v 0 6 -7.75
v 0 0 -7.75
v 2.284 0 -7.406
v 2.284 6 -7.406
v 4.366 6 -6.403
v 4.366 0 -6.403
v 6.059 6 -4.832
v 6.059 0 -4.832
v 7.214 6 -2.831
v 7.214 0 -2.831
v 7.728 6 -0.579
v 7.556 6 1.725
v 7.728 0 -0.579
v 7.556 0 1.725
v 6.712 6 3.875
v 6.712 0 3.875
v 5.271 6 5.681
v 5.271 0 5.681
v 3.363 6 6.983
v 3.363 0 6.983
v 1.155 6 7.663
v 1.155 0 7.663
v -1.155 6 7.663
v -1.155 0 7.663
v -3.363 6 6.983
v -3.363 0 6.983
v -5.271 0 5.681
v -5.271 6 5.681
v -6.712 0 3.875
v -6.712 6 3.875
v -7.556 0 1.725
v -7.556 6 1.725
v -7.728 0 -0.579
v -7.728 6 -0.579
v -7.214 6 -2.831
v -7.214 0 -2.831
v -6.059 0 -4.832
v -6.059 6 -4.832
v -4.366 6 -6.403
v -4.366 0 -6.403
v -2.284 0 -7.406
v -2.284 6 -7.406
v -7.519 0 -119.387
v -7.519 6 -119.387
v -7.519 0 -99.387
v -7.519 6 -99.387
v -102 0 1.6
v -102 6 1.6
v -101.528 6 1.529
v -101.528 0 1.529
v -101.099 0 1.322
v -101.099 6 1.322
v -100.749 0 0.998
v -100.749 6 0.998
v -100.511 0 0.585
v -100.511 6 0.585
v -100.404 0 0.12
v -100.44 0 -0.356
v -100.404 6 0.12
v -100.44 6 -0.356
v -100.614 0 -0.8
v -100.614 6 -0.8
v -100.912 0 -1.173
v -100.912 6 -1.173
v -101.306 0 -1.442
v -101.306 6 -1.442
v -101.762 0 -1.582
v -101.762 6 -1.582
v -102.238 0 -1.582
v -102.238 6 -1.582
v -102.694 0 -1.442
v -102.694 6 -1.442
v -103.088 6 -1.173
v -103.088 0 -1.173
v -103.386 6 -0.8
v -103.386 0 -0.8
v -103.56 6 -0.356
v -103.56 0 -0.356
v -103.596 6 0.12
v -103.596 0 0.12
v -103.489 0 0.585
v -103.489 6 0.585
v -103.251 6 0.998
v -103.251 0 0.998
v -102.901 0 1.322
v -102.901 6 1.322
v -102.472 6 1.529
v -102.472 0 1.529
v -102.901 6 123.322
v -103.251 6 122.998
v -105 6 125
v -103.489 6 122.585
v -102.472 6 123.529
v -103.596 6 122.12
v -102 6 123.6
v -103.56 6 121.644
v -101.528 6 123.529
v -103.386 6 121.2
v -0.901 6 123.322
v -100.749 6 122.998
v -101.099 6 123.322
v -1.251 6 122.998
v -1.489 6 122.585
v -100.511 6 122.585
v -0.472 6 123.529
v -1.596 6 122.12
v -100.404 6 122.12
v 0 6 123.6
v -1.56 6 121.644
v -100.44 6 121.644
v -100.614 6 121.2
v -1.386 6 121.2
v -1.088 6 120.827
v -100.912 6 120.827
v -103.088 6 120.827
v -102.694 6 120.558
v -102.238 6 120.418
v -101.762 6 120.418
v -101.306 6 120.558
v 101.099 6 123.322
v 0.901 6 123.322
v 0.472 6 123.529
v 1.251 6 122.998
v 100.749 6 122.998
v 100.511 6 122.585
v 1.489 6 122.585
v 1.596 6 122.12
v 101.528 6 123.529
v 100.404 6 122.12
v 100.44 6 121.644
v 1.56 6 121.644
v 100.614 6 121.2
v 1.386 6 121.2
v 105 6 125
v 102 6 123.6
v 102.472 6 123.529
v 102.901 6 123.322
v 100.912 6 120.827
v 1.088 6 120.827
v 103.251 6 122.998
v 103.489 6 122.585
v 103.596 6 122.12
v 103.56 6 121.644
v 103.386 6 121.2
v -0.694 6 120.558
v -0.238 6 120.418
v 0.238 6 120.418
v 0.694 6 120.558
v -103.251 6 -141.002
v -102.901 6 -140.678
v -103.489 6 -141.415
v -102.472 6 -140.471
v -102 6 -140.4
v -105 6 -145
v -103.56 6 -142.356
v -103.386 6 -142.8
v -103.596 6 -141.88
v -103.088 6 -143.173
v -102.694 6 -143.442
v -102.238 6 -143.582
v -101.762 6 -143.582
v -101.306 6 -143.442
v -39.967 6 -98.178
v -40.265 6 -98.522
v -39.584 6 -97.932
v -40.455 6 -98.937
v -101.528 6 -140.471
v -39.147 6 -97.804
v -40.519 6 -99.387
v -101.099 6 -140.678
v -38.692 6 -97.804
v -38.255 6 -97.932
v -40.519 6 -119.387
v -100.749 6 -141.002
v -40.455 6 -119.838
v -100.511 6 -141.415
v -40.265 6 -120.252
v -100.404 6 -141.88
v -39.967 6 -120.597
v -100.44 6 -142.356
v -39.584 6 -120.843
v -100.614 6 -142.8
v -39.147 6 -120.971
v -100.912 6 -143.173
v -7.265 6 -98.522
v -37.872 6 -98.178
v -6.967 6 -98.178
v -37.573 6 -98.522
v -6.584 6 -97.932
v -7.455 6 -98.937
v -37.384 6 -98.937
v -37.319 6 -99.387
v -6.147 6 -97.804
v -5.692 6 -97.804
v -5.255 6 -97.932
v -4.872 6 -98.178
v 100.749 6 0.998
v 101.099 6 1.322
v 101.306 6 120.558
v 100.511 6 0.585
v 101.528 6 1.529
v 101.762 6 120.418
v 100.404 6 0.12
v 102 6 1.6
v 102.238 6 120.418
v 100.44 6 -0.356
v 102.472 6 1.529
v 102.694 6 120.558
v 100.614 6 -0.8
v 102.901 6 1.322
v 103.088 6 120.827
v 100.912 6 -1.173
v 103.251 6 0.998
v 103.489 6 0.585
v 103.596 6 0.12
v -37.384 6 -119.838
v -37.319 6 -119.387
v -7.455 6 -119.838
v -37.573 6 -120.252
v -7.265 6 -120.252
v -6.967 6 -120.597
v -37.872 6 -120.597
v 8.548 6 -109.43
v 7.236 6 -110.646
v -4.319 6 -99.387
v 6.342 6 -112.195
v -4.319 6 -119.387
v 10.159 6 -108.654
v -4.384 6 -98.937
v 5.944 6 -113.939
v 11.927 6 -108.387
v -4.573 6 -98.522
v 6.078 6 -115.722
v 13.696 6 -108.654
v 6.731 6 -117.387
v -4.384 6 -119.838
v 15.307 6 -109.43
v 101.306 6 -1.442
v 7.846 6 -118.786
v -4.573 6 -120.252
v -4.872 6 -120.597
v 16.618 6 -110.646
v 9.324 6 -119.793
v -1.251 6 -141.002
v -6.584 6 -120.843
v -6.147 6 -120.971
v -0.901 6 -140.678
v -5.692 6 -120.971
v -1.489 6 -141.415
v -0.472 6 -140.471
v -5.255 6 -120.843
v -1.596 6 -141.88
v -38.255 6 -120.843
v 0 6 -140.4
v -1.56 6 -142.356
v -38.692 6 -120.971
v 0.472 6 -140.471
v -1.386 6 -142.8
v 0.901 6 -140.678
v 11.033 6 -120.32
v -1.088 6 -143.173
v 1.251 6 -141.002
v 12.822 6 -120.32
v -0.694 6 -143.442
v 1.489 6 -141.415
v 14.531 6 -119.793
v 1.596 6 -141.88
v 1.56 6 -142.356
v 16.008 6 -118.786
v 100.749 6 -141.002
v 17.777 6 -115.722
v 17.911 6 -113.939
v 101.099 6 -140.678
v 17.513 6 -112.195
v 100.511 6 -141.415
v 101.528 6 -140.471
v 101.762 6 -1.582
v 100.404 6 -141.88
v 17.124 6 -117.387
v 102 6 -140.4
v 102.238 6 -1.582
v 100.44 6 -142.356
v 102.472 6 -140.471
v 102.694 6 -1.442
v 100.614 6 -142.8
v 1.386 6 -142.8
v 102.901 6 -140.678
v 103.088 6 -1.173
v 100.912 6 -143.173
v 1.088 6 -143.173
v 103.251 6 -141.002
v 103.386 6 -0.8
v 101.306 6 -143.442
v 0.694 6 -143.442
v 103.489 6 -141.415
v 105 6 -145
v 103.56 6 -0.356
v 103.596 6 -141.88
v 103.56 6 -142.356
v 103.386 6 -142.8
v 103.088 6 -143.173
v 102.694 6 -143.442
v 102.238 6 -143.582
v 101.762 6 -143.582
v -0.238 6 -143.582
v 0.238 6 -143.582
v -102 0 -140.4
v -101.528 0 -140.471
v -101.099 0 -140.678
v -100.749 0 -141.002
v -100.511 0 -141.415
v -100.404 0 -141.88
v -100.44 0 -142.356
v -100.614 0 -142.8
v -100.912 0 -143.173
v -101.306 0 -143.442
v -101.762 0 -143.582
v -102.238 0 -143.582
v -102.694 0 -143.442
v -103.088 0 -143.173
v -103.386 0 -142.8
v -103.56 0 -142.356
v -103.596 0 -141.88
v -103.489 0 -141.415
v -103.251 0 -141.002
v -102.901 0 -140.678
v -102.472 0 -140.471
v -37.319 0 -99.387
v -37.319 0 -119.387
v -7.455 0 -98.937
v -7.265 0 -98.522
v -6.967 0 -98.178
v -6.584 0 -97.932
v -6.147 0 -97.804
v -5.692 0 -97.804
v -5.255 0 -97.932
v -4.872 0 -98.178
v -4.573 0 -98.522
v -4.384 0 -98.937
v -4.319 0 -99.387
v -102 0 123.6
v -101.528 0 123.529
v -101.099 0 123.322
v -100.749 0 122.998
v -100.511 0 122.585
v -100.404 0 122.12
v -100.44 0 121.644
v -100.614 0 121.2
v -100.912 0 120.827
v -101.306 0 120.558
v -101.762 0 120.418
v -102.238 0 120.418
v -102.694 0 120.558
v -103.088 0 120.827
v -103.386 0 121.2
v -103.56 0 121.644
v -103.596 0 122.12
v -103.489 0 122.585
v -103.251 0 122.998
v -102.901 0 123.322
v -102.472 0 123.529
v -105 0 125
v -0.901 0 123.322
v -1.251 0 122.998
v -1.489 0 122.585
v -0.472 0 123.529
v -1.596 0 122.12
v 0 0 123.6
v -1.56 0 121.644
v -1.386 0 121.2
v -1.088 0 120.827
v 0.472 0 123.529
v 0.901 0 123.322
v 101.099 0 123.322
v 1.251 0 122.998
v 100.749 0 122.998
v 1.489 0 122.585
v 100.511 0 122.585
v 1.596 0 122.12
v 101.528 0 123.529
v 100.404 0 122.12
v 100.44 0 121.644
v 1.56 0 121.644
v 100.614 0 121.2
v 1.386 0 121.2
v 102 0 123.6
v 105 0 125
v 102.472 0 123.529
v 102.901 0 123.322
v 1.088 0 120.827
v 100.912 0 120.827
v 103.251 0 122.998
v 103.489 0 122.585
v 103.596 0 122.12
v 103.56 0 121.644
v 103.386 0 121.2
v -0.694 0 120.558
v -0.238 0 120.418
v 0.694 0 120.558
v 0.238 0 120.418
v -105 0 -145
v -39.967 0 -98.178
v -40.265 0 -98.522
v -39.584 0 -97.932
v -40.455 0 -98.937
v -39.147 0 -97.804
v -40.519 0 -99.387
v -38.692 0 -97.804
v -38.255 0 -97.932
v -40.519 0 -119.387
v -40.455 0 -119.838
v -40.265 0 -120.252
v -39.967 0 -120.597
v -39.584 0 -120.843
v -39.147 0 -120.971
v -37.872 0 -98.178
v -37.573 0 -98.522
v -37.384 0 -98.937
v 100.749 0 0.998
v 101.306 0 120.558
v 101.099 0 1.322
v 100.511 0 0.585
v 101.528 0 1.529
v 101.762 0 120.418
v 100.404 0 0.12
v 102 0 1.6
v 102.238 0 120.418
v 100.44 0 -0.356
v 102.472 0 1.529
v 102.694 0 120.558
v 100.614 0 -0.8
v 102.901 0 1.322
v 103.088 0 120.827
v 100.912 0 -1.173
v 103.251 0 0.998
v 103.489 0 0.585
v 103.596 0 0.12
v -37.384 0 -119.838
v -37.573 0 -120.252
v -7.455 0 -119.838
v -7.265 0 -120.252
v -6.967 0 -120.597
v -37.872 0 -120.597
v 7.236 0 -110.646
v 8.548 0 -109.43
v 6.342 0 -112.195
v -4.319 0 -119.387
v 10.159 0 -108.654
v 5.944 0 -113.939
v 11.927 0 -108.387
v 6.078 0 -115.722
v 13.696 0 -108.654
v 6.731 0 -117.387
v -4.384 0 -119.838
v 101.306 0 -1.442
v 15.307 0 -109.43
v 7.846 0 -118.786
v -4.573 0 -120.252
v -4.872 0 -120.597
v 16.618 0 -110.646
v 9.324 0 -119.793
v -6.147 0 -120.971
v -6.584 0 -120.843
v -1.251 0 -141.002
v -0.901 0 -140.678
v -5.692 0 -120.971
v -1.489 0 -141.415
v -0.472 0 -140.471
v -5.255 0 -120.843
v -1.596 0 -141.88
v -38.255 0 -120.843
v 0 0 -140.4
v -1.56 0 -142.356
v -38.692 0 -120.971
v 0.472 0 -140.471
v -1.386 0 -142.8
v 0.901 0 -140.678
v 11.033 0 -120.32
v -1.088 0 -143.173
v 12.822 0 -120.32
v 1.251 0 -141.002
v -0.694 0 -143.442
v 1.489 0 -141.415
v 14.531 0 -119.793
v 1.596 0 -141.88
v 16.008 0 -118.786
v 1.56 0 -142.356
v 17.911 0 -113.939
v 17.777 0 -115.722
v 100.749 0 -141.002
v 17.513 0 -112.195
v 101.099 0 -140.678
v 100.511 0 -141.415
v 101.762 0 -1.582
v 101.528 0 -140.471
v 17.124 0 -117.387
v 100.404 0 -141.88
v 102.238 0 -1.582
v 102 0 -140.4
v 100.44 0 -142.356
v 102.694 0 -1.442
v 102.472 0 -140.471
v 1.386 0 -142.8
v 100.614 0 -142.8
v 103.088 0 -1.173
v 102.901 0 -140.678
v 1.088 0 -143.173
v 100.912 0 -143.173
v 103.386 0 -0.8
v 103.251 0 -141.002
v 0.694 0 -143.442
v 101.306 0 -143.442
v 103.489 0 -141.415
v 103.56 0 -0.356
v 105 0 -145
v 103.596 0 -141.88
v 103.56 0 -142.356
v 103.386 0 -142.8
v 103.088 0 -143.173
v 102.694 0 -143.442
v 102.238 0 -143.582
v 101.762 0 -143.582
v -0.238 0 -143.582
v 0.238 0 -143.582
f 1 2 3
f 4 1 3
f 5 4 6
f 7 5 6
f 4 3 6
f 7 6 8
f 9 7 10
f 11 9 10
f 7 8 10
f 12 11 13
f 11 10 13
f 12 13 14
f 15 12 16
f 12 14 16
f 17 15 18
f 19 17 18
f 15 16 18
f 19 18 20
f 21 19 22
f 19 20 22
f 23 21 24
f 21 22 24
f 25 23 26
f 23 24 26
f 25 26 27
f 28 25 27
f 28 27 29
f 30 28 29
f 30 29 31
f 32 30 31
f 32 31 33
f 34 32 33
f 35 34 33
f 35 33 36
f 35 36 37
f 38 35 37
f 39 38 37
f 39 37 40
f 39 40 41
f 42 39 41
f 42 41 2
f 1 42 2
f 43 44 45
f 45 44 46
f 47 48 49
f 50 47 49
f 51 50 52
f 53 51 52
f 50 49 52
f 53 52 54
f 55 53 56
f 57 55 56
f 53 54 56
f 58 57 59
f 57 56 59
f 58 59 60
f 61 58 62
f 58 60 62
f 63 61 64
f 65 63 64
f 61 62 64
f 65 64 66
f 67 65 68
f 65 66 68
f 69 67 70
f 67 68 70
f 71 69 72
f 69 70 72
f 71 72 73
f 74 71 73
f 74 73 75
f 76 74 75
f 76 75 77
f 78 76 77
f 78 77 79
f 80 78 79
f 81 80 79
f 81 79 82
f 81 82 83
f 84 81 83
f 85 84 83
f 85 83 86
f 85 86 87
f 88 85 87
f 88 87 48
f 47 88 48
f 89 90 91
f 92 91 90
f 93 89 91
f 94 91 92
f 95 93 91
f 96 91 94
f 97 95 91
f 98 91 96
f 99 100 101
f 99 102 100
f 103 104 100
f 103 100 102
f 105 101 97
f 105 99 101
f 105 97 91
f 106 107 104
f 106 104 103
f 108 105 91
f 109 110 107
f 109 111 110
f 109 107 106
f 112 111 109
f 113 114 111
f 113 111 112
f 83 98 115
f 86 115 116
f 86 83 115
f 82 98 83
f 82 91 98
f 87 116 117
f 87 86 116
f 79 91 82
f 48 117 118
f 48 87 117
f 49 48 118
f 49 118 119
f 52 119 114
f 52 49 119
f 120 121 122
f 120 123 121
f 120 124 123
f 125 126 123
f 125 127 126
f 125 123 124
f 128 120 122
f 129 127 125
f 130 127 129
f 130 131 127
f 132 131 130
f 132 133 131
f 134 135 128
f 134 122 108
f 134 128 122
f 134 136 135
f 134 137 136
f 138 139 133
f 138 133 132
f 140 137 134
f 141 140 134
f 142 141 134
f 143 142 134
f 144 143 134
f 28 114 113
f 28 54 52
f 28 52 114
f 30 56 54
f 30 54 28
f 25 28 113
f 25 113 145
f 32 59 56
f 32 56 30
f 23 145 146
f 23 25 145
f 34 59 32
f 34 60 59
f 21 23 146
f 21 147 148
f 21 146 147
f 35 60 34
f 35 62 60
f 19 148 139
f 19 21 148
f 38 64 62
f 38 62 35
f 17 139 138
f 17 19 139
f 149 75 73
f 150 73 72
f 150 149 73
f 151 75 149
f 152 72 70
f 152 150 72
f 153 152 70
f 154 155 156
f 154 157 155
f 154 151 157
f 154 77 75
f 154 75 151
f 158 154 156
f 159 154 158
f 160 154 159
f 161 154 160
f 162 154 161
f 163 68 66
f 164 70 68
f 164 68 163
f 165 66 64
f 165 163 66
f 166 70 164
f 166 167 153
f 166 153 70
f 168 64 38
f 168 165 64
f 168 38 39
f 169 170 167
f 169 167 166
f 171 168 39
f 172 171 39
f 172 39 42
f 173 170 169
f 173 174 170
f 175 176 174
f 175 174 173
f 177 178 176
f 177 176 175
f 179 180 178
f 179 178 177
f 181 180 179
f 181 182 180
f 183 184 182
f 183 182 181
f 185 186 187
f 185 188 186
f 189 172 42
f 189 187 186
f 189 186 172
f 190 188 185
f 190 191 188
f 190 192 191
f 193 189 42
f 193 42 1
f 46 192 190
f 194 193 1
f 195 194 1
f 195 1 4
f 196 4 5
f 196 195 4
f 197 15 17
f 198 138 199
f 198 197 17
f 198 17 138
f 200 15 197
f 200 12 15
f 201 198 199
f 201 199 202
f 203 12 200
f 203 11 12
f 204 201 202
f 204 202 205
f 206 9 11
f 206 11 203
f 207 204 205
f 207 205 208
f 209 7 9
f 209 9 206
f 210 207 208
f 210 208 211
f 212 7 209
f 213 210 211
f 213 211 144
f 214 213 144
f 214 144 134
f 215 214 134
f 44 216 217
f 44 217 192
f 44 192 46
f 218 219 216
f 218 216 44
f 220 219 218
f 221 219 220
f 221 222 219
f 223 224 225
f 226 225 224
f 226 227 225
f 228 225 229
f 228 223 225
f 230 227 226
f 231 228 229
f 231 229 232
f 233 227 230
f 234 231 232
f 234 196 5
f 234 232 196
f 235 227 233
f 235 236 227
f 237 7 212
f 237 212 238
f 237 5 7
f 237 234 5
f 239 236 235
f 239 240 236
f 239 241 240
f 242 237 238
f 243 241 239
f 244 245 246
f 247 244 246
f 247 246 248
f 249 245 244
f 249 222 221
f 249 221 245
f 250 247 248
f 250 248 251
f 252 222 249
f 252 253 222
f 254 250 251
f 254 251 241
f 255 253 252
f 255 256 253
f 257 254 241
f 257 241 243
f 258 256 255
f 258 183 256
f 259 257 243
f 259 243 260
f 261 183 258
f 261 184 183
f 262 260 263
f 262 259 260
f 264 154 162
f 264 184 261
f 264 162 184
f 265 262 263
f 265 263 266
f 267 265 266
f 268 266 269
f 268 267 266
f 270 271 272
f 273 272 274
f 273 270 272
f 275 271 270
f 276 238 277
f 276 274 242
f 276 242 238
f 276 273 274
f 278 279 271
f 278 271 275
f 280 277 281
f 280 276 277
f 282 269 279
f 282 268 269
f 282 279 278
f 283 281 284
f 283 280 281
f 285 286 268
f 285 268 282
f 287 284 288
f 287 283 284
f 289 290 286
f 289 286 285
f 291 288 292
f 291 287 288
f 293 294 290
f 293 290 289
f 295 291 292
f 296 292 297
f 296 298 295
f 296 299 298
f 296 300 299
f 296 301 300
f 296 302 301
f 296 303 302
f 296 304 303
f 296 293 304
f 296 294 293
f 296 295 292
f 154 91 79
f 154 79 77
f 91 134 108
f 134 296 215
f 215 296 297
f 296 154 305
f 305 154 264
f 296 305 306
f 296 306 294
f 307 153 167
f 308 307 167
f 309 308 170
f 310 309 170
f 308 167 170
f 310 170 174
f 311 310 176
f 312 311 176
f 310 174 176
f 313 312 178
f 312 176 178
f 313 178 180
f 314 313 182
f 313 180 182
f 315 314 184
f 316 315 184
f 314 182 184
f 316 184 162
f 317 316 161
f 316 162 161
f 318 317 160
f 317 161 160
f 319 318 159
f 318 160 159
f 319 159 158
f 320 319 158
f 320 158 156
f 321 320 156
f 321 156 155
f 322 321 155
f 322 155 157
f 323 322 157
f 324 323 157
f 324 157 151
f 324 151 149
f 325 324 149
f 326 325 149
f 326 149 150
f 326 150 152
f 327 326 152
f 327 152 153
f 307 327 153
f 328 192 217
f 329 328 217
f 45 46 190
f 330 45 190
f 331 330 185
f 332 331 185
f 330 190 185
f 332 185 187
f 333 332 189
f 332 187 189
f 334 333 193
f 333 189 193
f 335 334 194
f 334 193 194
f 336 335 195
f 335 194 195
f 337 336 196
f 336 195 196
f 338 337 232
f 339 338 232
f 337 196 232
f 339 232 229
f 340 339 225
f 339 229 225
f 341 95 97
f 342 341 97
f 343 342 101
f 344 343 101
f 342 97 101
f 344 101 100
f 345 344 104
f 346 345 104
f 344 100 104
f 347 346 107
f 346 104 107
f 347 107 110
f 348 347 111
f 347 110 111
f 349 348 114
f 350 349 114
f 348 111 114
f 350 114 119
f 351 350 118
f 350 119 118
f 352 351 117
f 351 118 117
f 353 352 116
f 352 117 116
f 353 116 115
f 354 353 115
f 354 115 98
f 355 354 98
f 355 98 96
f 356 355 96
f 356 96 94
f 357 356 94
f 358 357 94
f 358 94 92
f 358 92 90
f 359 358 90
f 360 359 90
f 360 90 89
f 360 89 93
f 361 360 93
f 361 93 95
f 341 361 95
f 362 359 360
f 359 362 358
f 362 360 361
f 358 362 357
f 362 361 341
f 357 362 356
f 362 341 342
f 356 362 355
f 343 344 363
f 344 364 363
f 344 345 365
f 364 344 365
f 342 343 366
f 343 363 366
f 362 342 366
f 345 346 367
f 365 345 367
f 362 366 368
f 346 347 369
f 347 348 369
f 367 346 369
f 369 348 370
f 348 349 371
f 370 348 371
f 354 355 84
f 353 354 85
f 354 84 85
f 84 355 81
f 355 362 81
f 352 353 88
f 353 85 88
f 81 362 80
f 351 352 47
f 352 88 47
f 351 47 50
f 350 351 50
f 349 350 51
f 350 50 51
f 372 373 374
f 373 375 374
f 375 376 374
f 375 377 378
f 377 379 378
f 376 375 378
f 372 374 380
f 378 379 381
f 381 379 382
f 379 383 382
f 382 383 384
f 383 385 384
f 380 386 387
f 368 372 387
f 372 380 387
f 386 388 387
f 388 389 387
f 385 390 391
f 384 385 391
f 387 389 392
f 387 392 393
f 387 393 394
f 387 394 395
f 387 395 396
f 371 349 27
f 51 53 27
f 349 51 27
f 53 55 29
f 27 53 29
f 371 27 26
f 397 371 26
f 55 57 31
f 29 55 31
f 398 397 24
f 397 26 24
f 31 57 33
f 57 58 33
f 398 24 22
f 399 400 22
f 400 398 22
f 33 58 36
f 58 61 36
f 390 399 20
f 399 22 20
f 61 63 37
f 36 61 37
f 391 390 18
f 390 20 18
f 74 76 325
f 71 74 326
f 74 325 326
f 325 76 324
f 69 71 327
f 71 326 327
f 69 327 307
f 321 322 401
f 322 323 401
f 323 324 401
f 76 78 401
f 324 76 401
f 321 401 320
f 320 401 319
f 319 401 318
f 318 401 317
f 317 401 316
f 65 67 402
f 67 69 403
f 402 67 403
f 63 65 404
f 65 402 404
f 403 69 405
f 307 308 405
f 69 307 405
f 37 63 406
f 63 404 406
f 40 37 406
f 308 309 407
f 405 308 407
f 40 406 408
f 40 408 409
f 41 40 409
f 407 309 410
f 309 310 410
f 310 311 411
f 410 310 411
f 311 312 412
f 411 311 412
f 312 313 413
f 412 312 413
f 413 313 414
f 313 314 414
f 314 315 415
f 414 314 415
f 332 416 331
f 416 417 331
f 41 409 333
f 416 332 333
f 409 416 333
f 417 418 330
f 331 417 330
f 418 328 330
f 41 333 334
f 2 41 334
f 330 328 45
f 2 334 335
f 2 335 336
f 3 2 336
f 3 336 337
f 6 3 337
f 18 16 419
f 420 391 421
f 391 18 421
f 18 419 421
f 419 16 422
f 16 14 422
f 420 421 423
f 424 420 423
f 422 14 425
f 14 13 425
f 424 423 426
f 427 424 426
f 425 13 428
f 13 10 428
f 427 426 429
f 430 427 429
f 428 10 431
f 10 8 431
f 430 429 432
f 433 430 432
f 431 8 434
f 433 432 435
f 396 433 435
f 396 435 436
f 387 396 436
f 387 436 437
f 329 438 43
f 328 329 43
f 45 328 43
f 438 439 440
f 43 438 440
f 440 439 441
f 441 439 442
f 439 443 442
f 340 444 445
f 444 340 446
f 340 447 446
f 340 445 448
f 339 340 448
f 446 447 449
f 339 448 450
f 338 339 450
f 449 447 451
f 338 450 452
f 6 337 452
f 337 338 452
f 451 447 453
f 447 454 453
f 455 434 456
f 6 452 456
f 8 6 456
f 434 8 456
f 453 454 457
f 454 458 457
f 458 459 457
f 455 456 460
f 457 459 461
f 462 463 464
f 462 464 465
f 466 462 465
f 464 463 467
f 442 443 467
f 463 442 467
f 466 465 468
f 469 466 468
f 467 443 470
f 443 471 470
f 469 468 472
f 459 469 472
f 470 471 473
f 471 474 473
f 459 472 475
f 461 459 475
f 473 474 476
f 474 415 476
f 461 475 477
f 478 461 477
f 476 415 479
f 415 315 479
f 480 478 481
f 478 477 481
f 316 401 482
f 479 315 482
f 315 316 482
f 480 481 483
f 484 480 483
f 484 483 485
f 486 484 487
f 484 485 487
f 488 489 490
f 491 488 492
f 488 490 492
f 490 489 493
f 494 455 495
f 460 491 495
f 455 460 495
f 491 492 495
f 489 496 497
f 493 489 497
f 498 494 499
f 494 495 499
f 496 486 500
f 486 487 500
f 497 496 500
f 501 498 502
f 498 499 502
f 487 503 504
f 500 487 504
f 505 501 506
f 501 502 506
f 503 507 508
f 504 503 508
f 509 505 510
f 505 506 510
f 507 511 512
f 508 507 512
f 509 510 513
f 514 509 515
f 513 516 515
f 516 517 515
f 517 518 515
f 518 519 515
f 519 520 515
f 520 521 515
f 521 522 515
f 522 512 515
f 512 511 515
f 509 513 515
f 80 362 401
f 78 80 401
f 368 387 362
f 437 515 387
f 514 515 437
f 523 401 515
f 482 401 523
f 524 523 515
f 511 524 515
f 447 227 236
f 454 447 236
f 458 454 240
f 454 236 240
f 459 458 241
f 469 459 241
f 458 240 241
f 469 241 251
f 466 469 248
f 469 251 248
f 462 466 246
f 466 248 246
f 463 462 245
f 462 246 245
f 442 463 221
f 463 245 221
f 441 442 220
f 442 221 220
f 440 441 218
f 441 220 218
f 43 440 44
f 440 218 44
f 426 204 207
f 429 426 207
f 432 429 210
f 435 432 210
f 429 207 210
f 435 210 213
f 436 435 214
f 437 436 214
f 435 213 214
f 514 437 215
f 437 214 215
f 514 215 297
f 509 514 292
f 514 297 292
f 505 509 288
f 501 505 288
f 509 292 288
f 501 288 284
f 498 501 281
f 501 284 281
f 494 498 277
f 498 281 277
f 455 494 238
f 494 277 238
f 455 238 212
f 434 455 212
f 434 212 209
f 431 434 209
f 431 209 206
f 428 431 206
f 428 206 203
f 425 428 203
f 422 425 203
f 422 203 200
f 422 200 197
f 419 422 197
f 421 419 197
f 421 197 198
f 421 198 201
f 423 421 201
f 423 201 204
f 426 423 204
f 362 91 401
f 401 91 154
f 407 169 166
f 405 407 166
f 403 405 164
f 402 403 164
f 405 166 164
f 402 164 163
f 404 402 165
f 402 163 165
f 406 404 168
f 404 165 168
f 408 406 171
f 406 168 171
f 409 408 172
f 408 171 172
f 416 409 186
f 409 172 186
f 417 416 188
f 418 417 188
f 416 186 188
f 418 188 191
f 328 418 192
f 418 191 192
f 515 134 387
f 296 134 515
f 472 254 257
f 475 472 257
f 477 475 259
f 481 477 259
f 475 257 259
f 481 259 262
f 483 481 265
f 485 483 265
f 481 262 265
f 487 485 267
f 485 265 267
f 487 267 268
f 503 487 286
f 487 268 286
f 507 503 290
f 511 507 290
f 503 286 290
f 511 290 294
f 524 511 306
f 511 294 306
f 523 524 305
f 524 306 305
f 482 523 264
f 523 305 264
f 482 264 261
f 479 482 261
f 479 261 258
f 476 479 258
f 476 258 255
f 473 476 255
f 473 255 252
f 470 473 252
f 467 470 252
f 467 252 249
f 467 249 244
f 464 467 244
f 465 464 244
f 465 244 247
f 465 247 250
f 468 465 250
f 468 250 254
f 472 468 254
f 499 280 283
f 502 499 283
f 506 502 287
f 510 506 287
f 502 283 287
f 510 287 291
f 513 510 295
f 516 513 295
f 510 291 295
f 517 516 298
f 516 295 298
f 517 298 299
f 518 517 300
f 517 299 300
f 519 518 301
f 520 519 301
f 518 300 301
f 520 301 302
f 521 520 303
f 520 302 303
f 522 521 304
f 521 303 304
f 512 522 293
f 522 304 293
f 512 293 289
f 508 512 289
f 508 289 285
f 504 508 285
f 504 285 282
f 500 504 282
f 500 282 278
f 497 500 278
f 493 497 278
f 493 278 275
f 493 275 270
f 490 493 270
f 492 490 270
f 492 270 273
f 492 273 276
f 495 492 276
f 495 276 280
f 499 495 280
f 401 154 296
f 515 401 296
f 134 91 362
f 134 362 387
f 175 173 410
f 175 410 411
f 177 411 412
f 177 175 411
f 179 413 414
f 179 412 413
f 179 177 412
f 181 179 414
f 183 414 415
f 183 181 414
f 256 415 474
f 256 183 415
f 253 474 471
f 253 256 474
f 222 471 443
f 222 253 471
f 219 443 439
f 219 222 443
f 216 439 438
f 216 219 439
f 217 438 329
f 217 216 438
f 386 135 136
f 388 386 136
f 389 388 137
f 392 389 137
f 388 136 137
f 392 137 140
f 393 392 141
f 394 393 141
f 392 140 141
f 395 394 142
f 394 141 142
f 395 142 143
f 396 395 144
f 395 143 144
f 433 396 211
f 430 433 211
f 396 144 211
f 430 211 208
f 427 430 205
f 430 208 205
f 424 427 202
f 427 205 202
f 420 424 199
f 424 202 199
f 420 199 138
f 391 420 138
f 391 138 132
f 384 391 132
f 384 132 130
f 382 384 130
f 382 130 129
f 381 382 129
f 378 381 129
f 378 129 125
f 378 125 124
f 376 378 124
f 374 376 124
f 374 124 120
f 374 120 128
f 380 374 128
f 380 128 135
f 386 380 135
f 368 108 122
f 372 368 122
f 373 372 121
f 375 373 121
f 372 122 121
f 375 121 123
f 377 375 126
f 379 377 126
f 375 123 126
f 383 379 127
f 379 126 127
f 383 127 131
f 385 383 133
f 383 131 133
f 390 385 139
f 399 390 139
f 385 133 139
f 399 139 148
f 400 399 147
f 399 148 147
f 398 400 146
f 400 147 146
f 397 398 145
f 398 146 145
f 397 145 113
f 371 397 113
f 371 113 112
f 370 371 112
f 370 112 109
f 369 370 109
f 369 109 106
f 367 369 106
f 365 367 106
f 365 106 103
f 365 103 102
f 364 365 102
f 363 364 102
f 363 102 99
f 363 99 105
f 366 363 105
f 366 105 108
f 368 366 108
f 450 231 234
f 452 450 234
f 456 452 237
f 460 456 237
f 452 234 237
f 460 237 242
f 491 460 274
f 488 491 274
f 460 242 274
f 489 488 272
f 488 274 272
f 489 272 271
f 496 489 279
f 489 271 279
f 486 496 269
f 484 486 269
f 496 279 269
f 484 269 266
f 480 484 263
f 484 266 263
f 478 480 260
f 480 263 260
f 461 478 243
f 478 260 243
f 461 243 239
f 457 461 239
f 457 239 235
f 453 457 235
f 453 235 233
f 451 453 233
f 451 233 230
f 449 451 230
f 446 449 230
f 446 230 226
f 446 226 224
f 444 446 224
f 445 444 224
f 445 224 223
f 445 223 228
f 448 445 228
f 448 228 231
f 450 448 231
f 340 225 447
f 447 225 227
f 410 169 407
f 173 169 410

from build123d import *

# Parameters (mm, degrees)
SKETCH1_W                                         = 150
SKETCH1_H                                         = 250
SKETCH1_R                                         = 1.75
BOSS_EXTRUDE1_DEPTH                               = 6
SKETCH2_R                                         = 11.25
CUT_EXTRUDE1_DEPTH                                = 6
CSK_FOR_M3_FLAT_HEAD_MACHINE_SCREW1_D             = 3.4
CSK_FOR_M3_FLAT_HEAD_MACHINE_SCREW1_CSINK_D       = 6.3
CSK_FOR_M3_FLAT_HEAD_MACHINE_SCREW1_CSINK_ANGLE   = 90
SKETCH5_W                                         = 150
SKETCH5_H                                         = 20
BOSS_EXTRUDE2_DEPTH                               = 6
CUT_EXTRUDE2_DEPTH                                = 22
SKETCH7_R                                         = 6
CUT_EXTRUDE3_DEPTH                                = 16
SKETCH8_W                                         = 30
SKETCH8_H                                         = 270
BOSS_EXTRUDE3_DEPTH                               = 6
SKETCH9_R                                         = 1.6
CUT_EXTRUDE4_DEPTH                                = 10
SKETCH10_R                                        = 1.6
CUT_EXTRUDE5_DEPTH                                = 10
CSK_FOR_M3_5_FLAT_HEAD_MACHINE_SCREW1_D           = 3.7
CSK_FOR_M3_5_FLAT_HEAD_MACHINE_SCREW1_DEPTH       = 6
CSK_FOR_M3_5_FLAT_HEAD_MACHINE_SCREW1_CSINK_D     = 8.2
CSK_FOR_M3_5_FLAT_HEAD_MACHINE_SCREW1_CSINK_ANGLE = 90
CSK_FOR_M3_5_FLAT_HEAD_MACHINE_SCREW1_TIP         = 1.111592145
SKETCH14_W                                        = 49.124994694
SKETCH14_H                                        = 58.099415668
BOSS_EXTRUDE4_DEPTH                               = 6
SKETCH15_R                                        = 7.75
CUT_EXTRUDE6_DEPTH                                = 10
CUT_EXTRUDE7_START                                = -10
CUT_EXTRUDE7_DEPTH                                = 10


with BuildPart() as part:
    # Sketch1 → Boss-Extrude1 (new body)
    with BuildSketch(Plane(origin=(0, 0, 0), x_dir=(1, 0, 0), z_dir=(0, 1, 0))):
        Rectangle(SKETCH1_W, SKETCH1_H)
        with Locations(Location((-9.899494937, 9.899494937, 0), (0, 0, 270))):
            Circle(SKETCH1_R, mode=Mode.SUBTRACT)
        with Locations(Location((9.899494937, 9.899494937, 0), (0, 0, 270))):
            Circle(SKETCH1_R, mode=Mode.SUBTRACT)
        with Locations(Location((-9.899494937, -9.899494937, 0), (0, 0, 270))):
            Circle(SKETCH1_R, mode=Mode.SUBTRACT)
        with Locations(Location((9.899494937, -9.899494937, 0), (0, 0, 270))):
            Circle(SKETCH1_R, mode=Mode.SUBTRACT)
    extrude(amount=BOSS_EXTRUDE1_DEPTH)

    # Sketch2 → Cut-Extrude1 (cut)
    with BuildSketch(Plane(origin=(0, 6, 0), x_dir=(1, 0, 0), z_dir=(0, 1, 0))):
        with Locations(Location((0, 0, 0), (0, 0, 270))):
            Circle(SKETCH2_R)
    extrude(amount=-CUT_EXTRUDE1_DEPTH, mode=Mode.SUBTRACT)

    # CSK for M3 Flat Head Machine Screw1 (through all)
    with Locations(Plane(origin=(0, 6, 0), x_dir=(1, 0, 0), z_dir=(0, 1, 0))):
        with Locations((-9.899494937, 9.899494937), (9.899494937, 9.899494937), (-9.899494937, -9.899494937), (9.899494937, -9.899494937)):
            CounterSinkHole(CSK_FOR_M3_FLAT_HEAD_MACHINE_SCREW1_D / 2, CSK_FOR_M3_FLAT_HEAD_MACHINE_SCREW1_CSINK_D / 2, counter_sink_angle=CSK_FOR_M3_FLAT_HEAD_MACHINE_SCREW1_CSINK_ANGLE)

    # Sketch5 → Boss-Extrude2 (add)
    with BuildSketch(Plane(origin=(0, 6, 0), x_dir=(1, 0, 0), z_dir=(0, 1, 0))):
        with Locations((0, 135)):
            Rectangle(SKETCH5_W, SKETCH5_H)
    extrude(amount=-BOSS_EXTRUDE2_DEPTH)

    # Sketch6 → Cut-Extrude2 (cut)
    with BuildSketch(Plane(origin=(0, 6, 0), x_dir=(1, 0, 0), z_dir=(0, 1, 0))):
        with BuildLine():
            Line((-37.319349673, 119.387337557), (-37.319349673, 109.387337557))
            ThreePointArc((-37.319349673, 109.387337557), (-38.919349673, 107.787337557), (-40.519349673, 109.387337557))
            Line((-40.519349673, 109.387337557), (-40.519349673, 119.387337557))
            ThreePointArc((-40.519349673, 119.387337557), (-38.919349673, 120.987337557), (-37.319349673, 119.387337557))
        make_face()
        with BuildLine():
            Line((-7.519349673, 119.387337557), (-7.519349673, 109.387337557))
            ThreePointArc((-7.519349673, 109.387337557), (-5.919349673, 107.787337557), (-4.319349673, 109.387337557))
            Line((-4.319349673, 109.387337557), (-4.319349673, 119.387337557))
            ThreePointArc((-4.319349673, 119.387337557), (-5.919349673, 120.987337557), (-7.519349673, 119.387337557))
        make_face()
    extrude(amount=-CUT_EXTRUDE2_DEPTH, mode=Mode.SUBTRACT)

    # Sketch7 → Cut-Extrude3 (cut)
    with BuildSketch(Plane(origin=(0, 6, 0), x_dir=(-1, 0, 0), z_dir=(0, 1, 0))):
        with Locations(Location((-11.927460167, -114.387337557, 0), (0, 0, 90))):
            Circle(SKETCH7_R)
    extrude(amount=-CUT_EXTRUDE3_DEPTH, mode=Mode.SUBTRACT)

    # Sketch8 → Boss-Extrude3 (add)
    with BuildSketch(Plane(origin=(0, 6, 0), x_dir=(1, 0, 0), z_dir=(0, 1, 0))):
        with Locations((-90, 10)):
            Rectangle(SKETCH8_W, SKETCH8_H)
        with Locations((90, 10)):
            Rectangle(SKETCH8_W, SKETCH8_H)
    extrude(amount=-BOSS_EXTRUDE3_DEPTH)

    # Sketch9 → Cut-Extrude4 (cut)
    with BuildSketch(Plane(origin=(0, 6, 0), x_dir=(1, 0, 0), z_dir=(0, 1, 0))):
        with Locations(Location((-102, 142, 0), (0, 0, 270))):
            Circle(SKETCH9_R)
        with Locations(Location((0, 142, 0), (0, 0, 270))):
            Circle(SKETCH9_R)
        with Locations(Location((102, 142, 0), (0, 0, 270))):
            Circle(SKETCH9_R)
        with Locations(Location((-102, 0, 0), (0, 0, 270))):
            Circle(SKETCH9_R)
        with Locations(Location((102, 0, 0), (0, 0, 270))):
            Circle(SKETCH9_R)
        with Locations(Location((-102, -122, 0), (0, 0, 270))):
            Circle(SKETCH9_R)
        with Locations(Location((102, -122, 0), (0, 0, 270))):
            Circle(SKETCH9_R)
        with Locations(Location((0, -122, 0), (0, 0, 270))):
            Circle(SKETCH9_R)
    extrude(amount=-CUT_EXTRUDE4_DEPTH, mode=Mode.SUBTRACT)

    # Sketch10 → Cut-Extrude5 (cut)
    with BuildSketch(Plane(origin=(0, 6, 0), x_dir=(1, 0, 0), z_dir=(0, 1, 0))):
        with Locations(Location((-15.5, 15.5, 0), (0, 0, 270))):
            Circle(SKETCH10_R)
        with Locations(Location((-15.5, -15.5, 0), (0, 0, 270))):
            Circle(SKETCH10_R)
        with Locations(Location((15.5, 15.5, 0), (0, 0, 270))):
            Circle(SKETCH10_R)
        with Locations(Location((15.5, -15.5, 0), (0, 0, 270))):
            Circle(SKETCH10_R)
    extrude(amount=-CUT_EXTRUDE5_DEPTH, mode=Mode.SUBTRACT)

    # CSK for M3.5 Flat Head Machine Screw1
    with Locations(Plane(origin=(0, 6, 0), x_dir=(1, 0, 0), z_dir=(0, 1, 0))):
        with Locations((-15.5, 15.5), (-15.5, -15.5), (15.5, -15.5), (15.5, 15.5)):
            CounterSinkHole(CSK_FOR_M3_5_FLAT_HEAD_MACHINE_SCREW1_D / 2, CSK_FOR_M3_5_FLAT_HEAD_MACHINE_SCREW1_CSINK_D / 2, depth=CSK_FOR_M3_5_FLAT_HEAD_MACHINE_SCREW1_DEPTH, counter_sink_angle=CSK_FOR_M3_5_FLAT_HEAD_MACHINE_SCREW1_CSINK_ANGLE)
            with Locations((0, 0, -(CSK_FOR_M3_5_FLAT_HEAD_MACHINE_SCREW1_DEPTH + CSK_FOR_M3_5_FLAT_HEAD_MACHINE_SCREW1_TIP / 2))):  # 118° drill point
                Cone(0, CSK_FOR_M3_5_FLAT_HEAD_MACHINE_SCREW1_D / 2, CSK_FOR_M3_5_FLAT_HEAD_MACHINE_SCREW1_TIP, mode=Mode.SUBTRACT)

    # Sketch14 → Boss-Extrude4 (add)
    with BuildSketch(Plane.XZ):
        Rectangle(SKETCH14_W, SKETCH14_H)
    extrude(amount=-BOSS_EXTRUDE4_DEPTH)

    # Sketch15 → Cut-Extrude6 (cut)
    with BuildSketch(Plane.XZ):
        with Locations(Location((0, 0, 0), (0, 0, 270))):
            Circle(SKETCH15_R)
    extrude(amount=-CUT_EXTRUDE6_DEPTH, mode=Mode.SUBTRACT)

    # Sketch17 → Cut-Extrude7 (cut)
    with BuildSketch(Plane.XZ.offset(CUT_EXTRUDE7_START)):
        with BuildLine():
            Line((-40.519349673, -119.387337557), (-40.519349673, -99.387337557))
            ThreePointArc((-40.519349673, -99.387337557), (-38.919349673, -97.787337557), (-37.319349673, -99.387337557))
            Line((-37.319349673, -99.387337557), (-37.319349673, -119.387337557))
            ThreePointArc((-37.319349673, -119.387337557), (-38.919349673, -120.987337557), (-40.519349673, -119.387337557))
        make_face()
        with BuildLine():
            Line((-7.519349673, -119.387337557), (-7.519349673, -99.387337557))
            ThreePointArc((-7.519349673, -99.387337557), (-5.919349673, -97.787337557), (-4.319349673, -99.387337557))
            Line((-4.319349673, -99.387337557), (-4.319349673, -119.387337557))
            ThreePointArc((-4.319349673, -119.387337557), (-5.919349673, -120.987337557), (-7.519349673, -119.387337557))
        make_face()
    extrude(amount=CUT_EXTRUDE7_DEPTH, mode=Mode.SUBTRACT)


solid = part.part
